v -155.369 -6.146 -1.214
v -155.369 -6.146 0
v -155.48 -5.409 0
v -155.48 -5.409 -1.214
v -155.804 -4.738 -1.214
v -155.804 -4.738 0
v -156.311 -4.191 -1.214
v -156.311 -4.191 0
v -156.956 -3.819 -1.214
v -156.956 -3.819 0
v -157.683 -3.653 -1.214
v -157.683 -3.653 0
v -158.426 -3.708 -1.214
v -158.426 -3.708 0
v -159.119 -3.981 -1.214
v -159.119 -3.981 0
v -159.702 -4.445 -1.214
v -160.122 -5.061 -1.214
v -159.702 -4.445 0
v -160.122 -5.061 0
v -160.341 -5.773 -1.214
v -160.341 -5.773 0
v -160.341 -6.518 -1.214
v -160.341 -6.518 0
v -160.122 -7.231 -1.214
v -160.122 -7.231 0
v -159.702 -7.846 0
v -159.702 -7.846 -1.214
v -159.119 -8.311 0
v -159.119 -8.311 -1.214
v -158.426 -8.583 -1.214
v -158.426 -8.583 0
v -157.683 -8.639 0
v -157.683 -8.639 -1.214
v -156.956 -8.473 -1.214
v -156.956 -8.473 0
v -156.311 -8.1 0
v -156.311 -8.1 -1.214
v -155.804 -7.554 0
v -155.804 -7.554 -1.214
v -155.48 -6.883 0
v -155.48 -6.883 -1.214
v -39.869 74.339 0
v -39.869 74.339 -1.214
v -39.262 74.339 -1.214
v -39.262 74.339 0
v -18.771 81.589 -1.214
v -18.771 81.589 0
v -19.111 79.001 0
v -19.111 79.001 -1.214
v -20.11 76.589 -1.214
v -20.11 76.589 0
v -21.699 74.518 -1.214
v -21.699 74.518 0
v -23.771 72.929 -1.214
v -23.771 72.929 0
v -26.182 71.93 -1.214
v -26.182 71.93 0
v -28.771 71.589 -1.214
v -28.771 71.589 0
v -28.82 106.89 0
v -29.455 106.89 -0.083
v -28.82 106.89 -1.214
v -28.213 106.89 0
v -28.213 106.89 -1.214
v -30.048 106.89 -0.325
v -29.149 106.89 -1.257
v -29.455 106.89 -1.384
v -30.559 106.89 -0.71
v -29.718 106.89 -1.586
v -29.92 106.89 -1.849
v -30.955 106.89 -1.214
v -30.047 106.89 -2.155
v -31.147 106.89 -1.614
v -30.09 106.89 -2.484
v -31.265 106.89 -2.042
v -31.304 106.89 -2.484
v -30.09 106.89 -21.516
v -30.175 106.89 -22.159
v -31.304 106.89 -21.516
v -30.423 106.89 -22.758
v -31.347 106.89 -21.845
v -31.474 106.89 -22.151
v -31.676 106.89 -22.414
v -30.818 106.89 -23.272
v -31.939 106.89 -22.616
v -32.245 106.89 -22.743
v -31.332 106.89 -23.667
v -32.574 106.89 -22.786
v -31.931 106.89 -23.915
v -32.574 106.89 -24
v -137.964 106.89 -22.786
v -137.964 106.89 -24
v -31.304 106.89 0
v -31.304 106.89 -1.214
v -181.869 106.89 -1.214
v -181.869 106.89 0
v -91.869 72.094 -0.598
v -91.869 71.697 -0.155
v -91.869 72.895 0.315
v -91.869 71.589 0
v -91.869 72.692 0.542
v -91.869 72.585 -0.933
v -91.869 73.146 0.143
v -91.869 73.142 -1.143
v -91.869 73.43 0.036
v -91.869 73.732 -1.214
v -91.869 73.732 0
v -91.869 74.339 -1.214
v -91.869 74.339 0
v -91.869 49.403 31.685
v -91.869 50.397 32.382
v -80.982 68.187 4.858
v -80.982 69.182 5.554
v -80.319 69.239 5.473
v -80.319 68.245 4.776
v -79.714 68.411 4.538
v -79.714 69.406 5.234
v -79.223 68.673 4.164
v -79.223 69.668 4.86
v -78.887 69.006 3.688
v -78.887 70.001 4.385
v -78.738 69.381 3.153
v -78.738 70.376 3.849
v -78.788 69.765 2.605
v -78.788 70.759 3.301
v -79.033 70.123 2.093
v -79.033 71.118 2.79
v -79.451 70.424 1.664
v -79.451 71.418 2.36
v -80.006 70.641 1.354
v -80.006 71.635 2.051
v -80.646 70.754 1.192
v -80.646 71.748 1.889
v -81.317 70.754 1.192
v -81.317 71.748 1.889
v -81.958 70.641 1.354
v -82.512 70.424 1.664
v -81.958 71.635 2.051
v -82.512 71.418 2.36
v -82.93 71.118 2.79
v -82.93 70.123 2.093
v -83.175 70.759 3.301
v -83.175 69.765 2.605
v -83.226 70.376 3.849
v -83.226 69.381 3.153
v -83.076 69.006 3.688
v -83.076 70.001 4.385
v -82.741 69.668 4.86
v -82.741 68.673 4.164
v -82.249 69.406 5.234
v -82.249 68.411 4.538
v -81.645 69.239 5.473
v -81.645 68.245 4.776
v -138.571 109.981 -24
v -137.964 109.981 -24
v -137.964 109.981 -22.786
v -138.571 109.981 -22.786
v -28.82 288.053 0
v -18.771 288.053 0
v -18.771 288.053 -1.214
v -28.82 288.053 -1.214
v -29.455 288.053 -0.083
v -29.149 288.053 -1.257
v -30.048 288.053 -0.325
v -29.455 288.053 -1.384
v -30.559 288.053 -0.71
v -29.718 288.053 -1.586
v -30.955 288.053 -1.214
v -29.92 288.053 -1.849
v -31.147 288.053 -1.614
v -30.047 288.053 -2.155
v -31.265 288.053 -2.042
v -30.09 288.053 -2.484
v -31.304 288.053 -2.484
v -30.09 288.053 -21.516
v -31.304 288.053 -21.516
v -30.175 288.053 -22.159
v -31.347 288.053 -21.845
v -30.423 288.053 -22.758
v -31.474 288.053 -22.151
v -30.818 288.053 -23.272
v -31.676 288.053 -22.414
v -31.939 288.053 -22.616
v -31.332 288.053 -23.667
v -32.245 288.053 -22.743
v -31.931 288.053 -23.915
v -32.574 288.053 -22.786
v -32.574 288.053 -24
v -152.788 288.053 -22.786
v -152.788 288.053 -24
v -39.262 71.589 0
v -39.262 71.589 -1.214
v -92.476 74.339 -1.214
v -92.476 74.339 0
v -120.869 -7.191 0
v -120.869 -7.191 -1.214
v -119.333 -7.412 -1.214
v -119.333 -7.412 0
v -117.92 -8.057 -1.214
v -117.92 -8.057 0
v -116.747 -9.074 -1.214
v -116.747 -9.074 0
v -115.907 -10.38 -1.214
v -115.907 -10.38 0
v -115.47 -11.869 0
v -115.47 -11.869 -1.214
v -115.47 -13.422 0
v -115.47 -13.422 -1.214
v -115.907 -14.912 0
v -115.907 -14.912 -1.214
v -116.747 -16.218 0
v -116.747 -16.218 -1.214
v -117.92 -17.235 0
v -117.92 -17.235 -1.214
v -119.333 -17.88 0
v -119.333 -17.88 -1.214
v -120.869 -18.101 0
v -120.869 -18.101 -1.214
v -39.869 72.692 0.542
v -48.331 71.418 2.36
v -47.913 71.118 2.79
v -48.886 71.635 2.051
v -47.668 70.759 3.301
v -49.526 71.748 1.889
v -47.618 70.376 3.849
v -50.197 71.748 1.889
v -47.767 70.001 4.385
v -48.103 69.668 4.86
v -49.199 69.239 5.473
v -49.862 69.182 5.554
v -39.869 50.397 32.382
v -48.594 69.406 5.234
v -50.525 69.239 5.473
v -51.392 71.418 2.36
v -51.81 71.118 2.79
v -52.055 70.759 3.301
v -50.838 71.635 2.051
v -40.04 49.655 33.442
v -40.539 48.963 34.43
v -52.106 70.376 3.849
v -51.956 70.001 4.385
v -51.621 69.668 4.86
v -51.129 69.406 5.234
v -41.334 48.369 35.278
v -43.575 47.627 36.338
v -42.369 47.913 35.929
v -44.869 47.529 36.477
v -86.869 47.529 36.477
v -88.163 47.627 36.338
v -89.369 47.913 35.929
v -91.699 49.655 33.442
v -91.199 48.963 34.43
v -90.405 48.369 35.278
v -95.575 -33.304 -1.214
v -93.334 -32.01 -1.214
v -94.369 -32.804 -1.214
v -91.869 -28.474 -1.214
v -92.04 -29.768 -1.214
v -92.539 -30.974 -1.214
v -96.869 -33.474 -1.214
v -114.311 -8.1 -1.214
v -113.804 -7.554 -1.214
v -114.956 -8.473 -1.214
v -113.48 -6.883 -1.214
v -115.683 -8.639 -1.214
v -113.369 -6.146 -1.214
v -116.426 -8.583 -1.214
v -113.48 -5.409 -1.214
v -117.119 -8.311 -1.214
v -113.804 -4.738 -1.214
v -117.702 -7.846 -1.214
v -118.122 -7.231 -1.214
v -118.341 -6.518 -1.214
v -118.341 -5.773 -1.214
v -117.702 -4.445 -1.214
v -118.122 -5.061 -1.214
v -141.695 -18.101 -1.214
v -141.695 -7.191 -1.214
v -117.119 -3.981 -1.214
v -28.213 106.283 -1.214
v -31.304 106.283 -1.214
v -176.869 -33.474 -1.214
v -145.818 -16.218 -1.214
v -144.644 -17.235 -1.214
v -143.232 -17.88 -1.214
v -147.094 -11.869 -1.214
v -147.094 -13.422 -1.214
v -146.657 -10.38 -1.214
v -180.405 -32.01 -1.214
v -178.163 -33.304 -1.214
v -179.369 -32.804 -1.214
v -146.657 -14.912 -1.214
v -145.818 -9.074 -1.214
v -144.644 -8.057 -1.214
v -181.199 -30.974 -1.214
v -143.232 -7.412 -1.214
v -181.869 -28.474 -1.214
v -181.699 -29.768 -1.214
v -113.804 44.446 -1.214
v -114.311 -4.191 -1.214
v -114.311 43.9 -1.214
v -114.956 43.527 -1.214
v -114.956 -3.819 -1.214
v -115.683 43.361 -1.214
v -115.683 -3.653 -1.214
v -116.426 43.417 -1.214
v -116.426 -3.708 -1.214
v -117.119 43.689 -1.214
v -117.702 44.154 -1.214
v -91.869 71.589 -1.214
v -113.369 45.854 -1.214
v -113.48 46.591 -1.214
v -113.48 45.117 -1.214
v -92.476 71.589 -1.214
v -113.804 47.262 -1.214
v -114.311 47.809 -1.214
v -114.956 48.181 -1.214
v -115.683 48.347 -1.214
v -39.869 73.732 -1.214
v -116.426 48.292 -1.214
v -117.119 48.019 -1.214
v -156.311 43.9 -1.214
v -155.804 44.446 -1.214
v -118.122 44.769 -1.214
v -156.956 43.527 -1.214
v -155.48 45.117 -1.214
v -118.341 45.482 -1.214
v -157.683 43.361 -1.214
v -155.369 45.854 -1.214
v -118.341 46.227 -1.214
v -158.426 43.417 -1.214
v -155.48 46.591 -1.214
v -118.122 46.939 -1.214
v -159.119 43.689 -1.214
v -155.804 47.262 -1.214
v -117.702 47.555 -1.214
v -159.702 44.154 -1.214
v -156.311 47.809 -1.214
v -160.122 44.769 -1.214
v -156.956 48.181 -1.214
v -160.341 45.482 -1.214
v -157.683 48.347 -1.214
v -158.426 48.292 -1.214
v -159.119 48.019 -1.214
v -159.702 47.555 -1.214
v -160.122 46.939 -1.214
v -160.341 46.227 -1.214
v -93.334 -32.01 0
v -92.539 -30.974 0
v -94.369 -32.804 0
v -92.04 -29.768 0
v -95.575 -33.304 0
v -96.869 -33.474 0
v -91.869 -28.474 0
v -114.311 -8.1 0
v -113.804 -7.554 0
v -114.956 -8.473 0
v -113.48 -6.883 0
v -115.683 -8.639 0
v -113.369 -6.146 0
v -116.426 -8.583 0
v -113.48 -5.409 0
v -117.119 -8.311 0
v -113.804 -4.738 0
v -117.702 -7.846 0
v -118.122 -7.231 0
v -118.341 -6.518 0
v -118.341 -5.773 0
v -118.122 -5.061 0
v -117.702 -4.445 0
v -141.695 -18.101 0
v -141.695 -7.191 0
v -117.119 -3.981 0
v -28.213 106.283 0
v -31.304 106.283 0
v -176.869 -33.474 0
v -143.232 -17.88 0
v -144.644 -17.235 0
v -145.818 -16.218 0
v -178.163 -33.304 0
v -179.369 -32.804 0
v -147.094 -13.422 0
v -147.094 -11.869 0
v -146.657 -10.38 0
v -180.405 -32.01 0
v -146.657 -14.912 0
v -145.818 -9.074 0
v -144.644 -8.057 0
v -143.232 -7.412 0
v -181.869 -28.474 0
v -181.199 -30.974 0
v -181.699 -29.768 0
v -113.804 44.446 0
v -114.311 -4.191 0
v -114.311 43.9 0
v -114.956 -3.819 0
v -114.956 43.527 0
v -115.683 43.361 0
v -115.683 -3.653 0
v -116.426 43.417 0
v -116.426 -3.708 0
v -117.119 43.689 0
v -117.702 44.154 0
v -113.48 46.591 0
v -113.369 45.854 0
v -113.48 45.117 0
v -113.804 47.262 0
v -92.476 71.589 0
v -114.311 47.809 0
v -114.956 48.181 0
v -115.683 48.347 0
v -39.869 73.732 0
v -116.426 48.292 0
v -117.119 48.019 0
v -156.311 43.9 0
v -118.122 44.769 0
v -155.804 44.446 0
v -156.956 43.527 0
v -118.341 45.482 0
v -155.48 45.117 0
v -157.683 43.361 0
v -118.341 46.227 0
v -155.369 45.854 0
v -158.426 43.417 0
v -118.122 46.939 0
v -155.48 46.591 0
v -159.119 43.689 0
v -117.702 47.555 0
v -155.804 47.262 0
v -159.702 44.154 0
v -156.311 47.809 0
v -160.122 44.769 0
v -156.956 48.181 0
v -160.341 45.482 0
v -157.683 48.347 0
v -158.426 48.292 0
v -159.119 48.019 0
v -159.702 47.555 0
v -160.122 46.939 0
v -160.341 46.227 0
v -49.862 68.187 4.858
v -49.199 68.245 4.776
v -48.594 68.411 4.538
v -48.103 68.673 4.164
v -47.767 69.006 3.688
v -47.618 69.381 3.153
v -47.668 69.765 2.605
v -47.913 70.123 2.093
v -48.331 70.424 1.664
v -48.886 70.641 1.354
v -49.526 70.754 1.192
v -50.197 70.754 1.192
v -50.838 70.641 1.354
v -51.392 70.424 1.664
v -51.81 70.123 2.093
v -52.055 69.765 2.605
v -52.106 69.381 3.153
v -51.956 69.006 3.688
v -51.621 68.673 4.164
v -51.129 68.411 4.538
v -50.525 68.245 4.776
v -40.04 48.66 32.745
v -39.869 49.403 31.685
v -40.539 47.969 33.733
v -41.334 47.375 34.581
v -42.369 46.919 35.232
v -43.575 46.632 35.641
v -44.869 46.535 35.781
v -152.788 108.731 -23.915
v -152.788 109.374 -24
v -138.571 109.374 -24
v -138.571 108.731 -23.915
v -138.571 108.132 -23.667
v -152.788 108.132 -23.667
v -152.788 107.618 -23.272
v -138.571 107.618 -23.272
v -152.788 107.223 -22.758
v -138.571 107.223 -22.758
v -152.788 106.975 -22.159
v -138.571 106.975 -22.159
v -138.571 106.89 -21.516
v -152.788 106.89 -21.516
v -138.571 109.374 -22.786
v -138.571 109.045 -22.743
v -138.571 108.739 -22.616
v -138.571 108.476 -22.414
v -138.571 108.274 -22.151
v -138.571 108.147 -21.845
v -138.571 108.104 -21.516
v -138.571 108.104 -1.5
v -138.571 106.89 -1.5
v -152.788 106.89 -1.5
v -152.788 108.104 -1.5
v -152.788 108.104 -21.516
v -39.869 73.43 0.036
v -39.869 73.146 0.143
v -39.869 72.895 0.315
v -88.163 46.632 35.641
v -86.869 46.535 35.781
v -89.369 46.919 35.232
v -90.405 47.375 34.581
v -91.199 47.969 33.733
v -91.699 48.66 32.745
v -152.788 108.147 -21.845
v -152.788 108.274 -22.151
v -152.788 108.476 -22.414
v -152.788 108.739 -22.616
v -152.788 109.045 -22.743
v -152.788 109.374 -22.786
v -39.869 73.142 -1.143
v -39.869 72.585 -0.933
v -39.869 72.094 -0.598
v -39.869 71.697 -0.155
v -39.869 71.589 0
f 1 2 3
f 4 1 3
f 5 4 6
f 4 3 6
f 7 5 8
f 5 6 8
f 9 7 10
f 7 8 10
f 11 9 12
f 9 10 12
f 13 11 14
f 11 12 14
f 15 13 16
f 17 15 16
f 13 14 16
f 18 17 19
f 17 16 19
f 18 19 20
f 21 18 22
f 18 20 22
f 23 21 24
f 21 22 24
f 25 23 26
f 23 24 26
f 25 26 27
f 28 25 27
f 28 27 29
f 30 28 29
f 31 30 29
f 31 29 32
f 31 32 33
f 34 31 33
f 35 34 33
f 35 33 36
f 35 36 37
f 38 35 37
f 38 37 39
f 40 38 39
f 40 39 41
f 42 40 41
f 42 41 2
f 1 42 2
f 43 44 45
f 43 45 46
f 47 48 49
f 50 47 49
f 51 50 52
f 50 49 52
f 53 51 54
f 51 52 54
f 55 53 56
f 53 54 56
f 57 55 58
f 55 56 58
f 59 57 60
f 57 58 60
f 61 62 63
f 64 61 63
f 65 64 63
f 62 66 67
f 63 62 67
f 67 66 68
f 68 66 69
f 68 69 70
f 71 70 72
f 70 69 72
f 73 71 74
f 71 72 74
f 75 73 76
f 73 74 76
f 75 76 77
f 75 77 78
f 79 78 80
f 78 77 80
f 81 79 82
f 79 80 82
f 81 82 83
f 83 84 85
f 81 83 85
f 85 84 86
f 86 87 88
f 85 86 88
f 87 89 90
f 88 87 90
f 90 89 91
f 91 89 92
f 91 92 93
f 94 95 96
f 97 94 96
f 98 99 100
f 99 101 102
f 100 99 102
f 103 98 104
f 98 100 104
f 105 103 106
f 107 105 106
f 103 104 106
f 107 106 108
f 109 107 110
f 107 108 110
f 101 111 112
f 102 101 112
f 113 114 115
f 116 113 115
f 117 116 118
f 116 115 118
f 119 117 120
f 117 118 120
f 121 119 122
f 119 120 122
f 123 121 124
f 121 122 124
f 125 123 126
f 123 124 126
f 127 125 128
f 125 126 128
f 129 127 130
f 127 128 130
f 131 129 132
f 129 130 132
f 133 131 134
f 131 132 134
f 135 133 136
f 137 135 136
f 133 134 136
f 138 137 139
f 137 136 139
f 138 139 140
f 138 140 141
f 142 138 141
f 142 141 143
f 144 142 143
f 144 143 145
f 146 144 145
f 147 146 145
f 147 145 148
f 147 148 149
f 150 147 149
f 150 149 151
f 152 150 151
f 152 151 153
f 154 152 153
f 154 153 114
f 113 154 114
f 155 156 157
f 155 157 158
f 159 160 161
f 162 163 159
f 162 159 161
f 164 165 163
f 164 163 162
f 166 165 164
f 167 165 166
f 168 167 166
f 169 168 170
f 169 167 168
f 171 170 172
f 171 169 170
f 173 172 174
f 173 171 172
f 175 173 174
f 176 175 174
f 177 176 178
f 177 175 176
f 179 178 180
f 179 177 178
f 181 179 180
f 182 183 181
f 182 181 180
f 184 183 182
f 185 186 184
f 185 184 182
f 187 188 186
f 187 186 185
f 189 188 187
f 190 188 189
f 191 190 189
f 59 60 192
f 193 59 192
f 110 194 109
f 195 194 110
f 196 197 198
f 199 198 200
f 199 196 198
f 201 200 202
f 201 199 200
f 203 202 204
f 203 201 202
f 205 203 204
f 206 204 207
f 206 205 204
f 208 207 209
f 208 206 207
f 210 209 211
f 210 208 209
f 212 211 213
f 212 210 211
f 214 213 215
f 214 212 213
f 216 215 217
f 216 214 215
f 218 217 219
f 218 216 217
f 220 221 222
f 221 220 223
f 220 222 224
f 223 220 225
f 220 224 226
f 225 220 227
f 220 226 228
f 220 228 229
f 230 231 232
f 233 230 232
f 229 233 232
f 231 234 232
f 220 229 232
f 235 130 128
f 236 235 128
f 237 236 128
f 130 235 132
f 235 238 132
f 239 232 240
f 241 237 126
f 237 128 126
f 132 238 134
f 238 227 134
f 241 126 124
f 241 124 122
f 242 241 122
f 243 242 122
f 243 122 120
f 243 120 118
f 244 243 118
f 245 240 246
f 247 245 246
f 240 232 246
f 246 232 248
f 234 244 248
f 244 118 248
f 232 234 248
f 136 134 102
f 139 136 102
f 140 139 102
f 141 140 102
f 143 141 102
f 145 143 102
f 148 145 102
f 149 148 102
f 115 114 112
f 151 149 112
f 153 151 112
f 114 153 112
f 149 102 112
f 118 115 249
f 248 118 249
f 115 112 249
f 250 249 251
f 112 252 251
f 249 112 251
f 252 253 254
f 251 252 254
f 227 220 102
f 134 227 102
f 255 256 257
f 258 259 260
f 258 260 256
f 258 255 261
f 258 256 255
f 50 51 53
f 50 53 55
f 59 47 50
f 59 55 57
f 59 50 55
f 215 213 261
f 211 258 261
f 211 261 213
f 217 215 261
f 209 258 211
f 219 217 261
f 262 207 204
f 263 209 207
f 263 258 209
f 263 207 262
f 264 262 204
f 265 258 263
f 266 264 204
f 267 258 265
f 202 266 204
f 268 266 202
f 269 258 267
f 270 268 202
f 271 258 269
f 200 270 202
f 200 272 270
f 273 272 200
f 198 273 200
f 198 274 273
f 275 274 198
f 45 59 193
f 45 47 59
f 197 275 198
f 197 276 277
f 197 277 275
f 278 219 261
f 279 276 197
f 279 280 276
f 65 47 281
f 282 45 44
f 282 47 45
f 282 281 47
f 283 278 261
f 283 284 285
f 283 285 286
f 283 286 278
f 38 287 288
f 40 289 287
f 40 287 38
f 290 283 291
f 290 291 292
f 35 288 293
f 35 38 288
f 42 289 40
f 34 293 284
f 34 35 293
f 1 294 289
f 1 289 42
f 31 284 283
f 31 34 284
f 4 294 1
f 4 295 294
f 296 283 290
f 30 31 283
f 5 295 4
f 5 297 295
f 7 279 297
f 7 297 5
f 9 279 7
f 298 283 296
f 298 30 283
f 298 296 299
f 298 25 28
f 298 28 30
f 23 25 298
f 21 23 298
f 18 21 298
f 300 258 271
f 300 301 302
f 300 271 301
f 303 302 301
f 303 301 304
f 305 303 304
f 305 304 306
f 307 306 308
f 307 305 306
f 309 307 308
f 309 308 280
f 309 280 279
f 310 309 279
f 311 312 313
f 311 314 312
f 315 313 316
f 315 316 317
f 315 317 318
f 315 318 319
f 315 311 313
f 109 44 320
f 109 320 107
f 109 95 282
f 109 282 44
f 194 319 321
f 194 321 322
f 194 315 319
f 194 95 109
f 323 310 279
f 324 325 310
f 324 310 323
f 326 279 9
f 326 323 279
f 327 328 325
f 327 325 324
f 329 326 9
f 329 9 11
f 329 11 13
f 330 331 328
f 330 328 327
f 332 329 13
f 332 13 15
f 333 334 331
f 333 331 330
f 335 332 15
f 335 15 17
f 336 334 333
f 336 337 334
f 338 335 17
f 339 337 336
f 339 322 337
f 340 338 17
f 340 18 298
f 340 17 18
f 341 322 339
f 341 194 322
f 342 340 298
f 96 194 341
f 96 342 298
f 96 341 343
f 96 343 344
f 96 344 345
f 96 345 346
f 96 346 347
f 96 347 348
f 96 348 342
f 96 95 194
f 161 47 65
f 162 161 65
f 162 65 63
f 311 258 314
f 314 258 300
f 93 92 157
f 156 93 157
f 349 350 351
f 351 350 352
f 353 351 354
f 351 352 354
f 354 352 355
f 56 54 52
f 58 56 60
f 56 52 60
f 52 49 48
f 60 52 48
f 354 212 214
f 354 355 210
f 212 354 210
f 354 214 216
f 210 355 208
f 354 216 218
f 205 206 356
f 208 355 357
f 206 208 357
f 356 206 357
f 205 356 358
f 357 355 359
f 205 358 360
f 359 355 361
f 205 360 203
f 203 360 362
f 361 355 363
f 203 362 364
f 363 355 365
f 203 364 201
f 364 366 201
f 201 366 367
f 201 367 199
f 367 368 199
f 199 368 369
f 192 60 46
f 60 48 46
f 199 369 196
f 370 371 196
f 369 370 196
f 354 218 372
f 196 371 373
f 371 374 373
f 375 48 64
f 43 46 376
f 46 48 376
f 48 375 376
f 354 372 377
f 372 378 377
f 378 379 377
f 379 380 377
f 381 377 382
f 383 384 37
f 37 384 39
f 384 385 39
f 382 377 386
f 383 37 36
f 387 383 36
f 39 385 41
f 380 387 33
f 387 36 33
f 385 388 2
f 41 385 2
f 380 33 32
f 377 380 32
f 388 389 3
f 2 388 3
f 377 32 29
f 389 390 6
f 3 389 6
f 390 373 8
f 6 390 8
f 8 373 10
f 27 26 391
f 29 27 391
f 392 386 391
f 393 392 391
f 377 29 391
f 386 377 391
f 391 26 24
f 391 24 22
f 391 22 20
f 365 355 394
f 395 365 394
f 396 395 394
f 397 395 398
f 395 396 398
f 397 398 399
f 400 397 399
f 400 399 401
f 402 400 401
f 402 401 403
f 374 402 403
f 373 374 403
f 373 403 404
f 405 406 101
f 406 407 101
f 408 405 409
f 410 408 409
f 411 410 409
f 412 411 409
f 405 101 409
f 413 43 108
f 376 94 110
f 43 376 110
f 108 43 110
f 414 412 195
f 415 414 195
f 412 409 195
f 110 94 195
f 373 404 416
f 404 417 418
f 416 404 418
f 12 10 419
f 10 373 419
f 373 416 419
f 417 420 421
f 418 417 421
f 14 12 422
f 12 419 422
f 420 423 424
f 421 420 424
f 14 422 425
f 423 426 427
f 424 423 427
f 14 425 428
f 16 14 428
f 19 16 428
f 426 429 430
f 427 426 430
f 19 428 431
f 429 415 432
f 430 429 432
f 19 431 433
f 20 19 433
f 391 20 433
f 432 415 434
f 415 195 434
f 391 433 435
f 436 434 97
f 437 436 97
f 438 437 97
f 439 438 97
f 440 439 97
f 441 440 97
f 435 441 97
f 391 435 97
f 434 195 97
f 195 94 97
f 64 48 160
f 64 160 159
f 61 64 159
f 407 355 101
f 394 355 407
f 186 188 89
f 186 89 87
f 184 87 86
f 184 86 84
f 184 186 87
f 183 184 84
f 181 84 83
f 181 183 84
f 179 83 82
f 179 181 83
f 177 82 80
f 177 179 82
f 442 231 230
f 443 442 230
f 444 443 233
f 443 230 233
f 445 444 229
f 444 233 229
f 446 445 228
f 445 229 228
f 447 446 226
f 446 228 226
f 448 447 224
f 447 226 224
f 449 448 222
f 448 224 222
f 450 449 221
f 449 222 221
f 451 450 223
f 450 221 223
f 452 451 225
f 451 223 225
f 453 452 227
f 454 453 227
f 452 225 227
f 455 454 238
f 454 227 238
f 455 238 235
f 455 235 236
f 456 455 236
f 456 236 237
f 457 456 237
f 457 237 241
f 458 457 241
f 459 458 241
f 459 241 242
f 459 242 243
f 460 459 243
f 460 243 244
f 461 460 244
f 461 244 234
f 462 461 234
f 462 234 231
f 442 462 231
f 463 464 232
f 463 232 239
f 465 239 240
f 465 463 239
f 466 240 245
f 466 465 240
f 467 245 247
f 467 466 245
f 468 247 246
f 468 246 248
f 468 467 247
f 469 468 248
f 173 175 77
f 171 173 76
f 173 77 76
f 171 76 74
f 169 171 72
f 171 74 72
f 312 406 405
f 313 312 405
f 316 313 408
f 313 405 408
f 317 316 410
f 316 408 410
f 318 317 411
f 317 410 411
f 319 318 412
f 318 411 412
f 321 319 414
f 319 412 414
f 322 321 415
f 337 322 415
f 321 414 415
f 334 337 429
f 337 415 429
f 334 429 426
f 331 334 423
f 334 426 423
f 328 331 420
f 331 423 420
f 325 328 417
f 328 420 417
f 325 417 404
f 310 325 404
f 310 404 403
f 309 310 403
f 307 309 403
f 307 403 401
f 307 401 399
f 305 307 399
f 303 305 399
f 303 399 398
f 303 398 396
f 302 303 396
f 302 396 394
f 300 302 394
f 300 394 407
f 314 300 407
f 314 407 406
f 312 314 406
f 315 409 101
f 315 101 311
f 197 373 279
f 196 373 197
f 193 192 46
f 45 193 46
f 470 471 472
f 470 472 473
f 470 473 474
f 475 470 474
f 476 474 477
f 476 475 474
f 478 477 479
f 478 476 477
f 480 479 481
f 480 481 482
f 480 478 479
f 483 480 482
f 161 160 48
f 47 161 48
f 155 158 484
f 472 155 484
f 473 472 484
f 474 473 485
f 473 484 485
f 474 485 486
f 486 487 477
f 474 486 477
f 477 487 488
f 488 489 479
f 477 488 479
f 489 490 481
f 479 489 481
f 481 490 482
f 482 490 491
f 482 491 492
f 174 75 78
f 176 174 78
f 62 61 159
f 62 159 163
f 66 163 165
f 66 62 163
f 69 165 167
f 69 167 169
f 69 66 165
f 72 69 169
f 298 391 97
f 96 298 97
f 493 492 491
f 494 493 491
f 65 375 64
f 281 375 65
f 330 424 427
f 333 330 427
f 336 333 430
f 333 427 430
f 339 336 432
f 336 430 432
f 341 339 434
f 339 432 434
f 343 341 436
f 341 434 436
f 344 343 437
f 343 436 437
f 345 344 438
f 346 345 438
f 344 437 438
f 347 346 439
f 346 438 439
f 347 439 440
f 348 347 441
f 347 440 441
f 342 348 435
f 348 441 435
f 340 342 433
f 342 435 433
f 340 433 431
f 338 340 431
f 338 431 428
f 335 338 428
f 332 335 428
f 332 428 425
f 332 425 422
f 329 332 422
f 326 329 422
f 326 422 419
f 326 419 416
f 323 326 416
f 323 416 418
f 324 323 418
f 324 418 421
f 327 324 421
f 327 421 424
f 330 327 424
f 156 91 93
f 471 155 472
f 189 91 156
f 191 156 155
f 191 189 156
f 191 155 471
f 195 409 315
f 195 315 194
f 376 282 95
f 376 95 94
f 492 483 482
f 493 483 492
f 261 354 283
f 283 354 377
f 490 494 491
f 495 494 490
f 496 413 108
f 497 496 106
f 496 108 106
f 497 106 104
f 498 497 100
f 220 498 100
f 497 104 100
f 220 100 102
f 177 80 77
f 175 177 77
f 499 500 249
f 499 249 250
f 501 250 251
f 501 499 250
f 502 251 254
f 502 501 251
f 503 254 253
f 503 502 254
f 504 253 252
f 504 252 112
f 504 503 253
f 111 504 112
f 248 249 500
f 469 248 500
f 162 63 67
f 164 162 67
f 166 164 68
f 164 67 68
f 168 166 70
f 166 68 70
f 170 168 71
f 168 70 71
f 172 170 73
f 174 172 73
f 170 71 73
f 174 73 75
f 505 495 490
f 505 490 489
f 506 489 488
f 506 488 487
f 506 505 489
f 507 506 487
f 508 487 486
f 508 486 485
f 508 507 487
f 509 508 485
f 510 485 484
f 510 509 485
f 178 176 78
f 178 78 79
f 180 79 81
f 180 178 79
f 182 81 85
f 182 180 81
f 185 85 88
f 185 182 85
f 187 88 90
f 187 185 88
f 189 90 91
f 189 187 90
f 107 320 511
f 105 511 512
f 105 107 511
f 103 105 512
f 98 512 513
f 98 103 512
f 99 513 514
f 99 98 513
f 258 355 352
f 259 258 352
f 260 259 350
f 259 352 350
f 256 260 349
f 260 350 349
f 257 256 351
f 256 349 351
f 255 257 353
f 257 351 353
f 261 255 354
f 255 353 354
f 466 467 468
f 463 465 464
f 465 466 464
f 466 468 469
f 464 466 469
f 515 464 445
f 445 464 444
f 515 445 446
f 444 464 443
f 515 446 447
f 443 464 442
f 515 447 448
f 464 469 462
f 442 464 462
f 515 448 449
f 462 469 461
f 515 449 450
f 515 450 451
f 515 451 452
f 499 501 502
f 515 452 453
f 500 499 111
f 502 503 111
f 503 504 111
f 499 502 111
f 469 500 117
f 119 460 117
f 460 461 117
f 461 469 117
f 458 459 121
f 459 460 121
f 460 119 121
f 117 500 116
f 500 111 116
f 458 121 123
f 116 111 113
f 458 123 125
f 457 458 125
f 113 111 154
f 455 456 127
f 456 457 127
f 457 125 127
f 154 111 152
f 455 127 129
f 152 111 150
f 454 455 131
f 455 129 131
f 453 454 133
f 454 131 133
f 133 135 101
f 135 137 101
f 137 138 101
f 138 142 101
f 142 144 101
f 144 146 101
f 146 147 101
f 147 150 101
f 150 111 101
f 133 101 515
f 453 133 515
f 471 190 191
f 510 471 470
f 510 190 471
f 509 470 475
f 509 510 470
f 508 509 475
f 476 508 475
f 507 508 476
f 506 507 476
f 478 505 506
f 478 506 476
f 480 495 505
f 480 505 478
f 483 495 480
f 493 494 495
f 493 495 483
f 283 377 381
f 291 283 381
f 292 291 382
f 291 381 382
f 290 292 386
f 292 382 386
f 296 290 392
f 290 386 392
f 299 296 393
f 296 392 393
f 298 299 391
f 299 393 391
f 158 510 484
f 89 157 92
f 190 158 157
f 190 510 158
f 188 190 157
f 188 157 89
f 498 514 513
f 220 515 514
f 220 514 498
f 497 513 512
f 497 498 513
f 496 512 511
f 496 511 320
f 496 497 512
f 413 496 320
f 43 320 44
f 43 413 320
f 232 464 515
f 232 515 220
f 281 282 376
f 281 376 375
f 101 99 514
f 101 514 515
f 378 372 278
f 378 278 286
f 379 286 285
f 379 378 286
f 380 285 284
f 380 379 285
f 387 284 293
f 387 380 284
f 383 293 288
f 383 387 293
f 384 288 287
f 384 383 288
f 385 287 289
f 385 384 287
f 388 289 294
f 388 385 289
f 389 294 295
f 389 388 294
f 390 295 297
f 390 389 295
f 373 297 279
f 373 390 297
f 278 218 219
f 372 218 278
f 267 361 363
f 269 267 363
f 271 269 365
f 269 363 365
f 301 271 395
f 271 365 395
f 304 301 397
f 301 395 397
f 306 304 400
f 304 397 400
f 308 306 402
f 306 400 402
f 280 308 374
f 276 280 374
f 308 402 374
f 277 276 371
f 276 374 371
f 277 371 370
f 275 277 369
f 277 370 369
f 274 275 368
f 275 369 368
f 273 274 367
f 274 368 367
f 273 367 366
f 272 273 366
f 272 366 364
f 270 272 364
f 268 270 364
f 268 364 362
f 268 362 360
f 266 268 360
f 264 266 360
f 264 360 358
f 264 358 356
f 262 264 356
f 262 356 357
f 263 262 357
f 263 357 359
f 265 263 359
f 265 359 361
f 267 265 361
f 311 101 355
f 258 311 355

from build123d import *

# Parameters (mm, degrees)
BASE_FLANGE1_DEPTH            = 1.21412
SKETCH19_W                    = 150.565156201
SKETCH19_H                    = 181.162980563
CUT_EXTRUDE2_DEPTH            = 5
EDGE_FLANGE5_START            = 106.282964216
EDGE_FLANGE5_DEPTH            = 181.770040563
EDGE_FLANGE5_2_DEPTH          = 0.60706
EDGE_FLANGE5_START_2          = 106.890024216
EDGE_FLANGE5_3_DEPTH          = 181.162980563
EDGE_FLANGE6_STRIP_W          = 7.39648
EDGE_FLANGE6_STRIP_H          = 1.21412
EDGE_FLANGE6_STRIP_CUT_DEPTH  = 181.162980563
EDGE_FLANGE6_DEPTH            = 181.162980563
EDGE_FLANGE7_STRIP_W          = 7.39648
EDGE_FLANGE7_STRIP_H          = 1.21412
EDGE_FLANGE7_STRIP_CUT_DEPTH  = 14.216886025
EDGE_FLANGE7_RELIEF_W         = 8.00354
EDGE_FLANGE7_RELIEF_H         = 0.60706
EDGE_FLANGE7_RELIEF_CUT_DEPTH = 1.21412
EDGE_FLANGE7_DEPTH            = 14.216886025
SKETCH29_R                    = 2.5
CUT_EXTRUDE3_DEPTH            = 5
EDGE_FLANGE8_START            = -92.476413081
EDGE_FLANGE8_DEPTH            = 53.21412
EDGE_FLANGE8_2_DEPTH          = 0.60706
EDGE_FLANGE8_START_2          = -39.869353081
EDGE_FLANGE8_3_DEPTH          = 0.60706
EDGE_FLANGE8_START_3          = -91.869353081
EDGE_FLANGE8_4_DEPTH          = 52
EDGE_FLANGE8_START_4          = 58
EDGE_FLANGE8_5_DEPTH          = 2.895111402
SKETCH34_R                    = 2.25
CUT_EXTRUDE6_DEPTH            = 10


with BuildPart() as part:
    # Base-Flange1: sheet metal written as solids
    # Sketch1 → Base-Flange1 (new body)
    with BuildSketch(Plane.XY):
        with BuildLine():
            Line((-96.869353081, -33.474110531), (-176.869353081, -33.474110531))
            ThreePointArc((-176.869353081, -33.474110531), (-180.404886987, -32.009644437), (-181.869353081, -28.474110531))
            Line((-181.869353081, -28.474110531), (-181.869353081, 288.053004779))
            Line((-181.869353081, 288.053004779), (-18.770502539, 288.053004779))
            Line((-18.770502539, 288.053004779), (-18.770502539, 81.588857582))
            ThreePointArc((-18.770502539, 81.588857582), (-21.699434728, 74.51778977), (-28.770502539, 71.588857582))
            Line((-28.770502539, 71.588857582), (-91.869353081, 71.588857582))
            Line((-91.869353081, 71.588857582), (-91.869353081, -28.474110531))
            ThreePointArc((-91.869353081, -28.474110531), (-93.333819175, -32.009644437), (-96.869353081, -33.474110531))
        make_face()
    extrude(amount=-BASE_FLANGE1_DEPTH)

    # Sketch19 → Cut-Extrude2 (cut)
    with BuildSketch(Plane(origin=(0, 0, -1.21412), x_dir=(-1, 0, 0), z_dir=(0, 0, -1))):
        with Locations((106.586774981, 197.471514497)):
            Rectangle(SKETCH19_W, SKETCH19_H)
    extrude(amount=-CUT_EXTRUDE2_DEPTH, mode=Mode.SUBTRACT)

    # Edge-Flange5: read off the stored shape, not the designer's step
    # Edge-Flange5 outline → Edge-Flange5 (cut)
    with BuildSketch(Plane(origin=(0, 0, 0), x_dir=(1, 0, 0), z_dir=(0, 1, 0)).offset(EDGE_FLANGE5_START)):
        with BuildLine():
            Line((-31.30419688, 0), (-28.82007688, 0))
            ThreePointArc((-28.82007688, 0), (-30.04808742, 0.324758454), (-30.955012985, 1.21412))
            Line((-30.955012985, 1.21412), (-31.30419688, 1.21412))
            Line((-31.30419688, 1.21412), (-31.30419688, 0))
        make_face()
    extrude(amount=EDGE_FLANGE5_DEPTH, mode=Mode.SUBTRACT)

    # Edge-Flange5 2 outline → Edge-Flange5 2 (cut)
    with BuildSketch(Plane(origin=(0, 0, 0), x_dir=(1, 0, 0), z_dir=(0, 1, 0)).offset(EDGE_FLANGE5_START)):
        with BuildLine():
            Line((-28.21301688, 0), (-28.21301688, 1.21412))
            Line((-28.21301688, 1.21412), (-30.955012985, 1.21412))
            ThreePointArc((-30.955012985, 1.21412), (-30.04808742, 0.324758454), (-28.82007688, 0))
            Line((-28.82007688, 0), (-28.21301688, 0))
        make_face()
    extrude(amount=EDGE_FLANGE5_2_DEPTH, mode=Mode.SUBTRACT)

    # Edge-Flange5 3 outline → Edge-Flange5 3 (add)
    with BuildSketch(Plane(origin=(0, 0, 0), x_dir=(1, 0, 0), z_dir=(0, 1, 0)).offset(EDGE_FLANGE5_START_2)):
        with BuildLine():
            Line((-30.955012985, 1.21412), (-28.82007688, 1.21412))
            ThreePointArc((-28.82007688, 1.21412), (-29.718102492, 1.586094388), (-30.09007688, 2.48412))
            Line((-30.09007688, 2.48412), (-30.09007688, 24))
            Line((-30.09007688, 24), (-31.30419688, 24))
            Line((-31.30419688, 24), (-31.30419688, 2.48412))
            ThreePointArc((-31.30419688, 2.48412), (-31.215310653, 1.825555388), (-30.955012985, 1.21412))
        make_face()
    extrude(amount=EDGE_FLANGE5_3_DEPTH)

    # Edge-Flange6: sheet metal written as solids
    # Edge-Flange6 strip (on a plane across the edge) → Edge-Flange6 strip cut (cut)
    with BuildSketch(Plane(origin=(-31.30419688, 288.053004779, -24), x_dir=(0, 0, 1), z_dir=(0, -1, 0))):
        with Locations((-1.21412, -0.60706)):
            Rectangle(EDGE_FLANGE6_STRIP_W, EDGE_FLANGE6_STRIP_H)
    extrude(amount=EDGE_FLANGE6_STRIP_CUT_DEPTH, mode=Mode.SUBTRACT)

    # Edge-Flange6 section (on a plane across the edge) → Edge-Flange6 (add)
    with BuildSketch(Plane(origin=(-31.30419688, 288.053004779, -24), x_dir=(0, 0, 1), z_dir=(0, -1, 0))):
        with BuildLine():
            Line((0, 1.27), (0, 121.48412))
            Line((0, 121.48412), (1.21412, 121.48412))
            Line((1.21412, 121.48412), (1.21412, 1.27))
            ThreePointArc((1.21412, 1.27), (1.586094388, 0.371974388), (2.48412, 0))
            Line((2.48412, 0), (2.48412, -1.21412))
            ThreePointArc((2.48412, -1.21412), (0.727581903, -0.486538097), (0, 1.27))
        make_face()
    extrude(amount=EDGE_FLANGE6_DEPTH)

    # Edge-Flange7: sheet metal written as solids
    # Edge-Flange7 strip (on a plane across the edge) → Edge-Flange7 strip cut (cut)
    with BuildSketch(Plane(origin=(-152.78831688, 106.890024216, -22.78588), x_dir=(0, 1, 0), z_dir=(1, 0, 0))):
        with Locations((-1.21412, -0.60706)):
            Rectangle(EDGE_FLANGE7_STRIP_W, EDGE_FLANGE7_STRIP_H)
    extrude(amount=EDGE_FLANGE7_STRIP_CUT_DEPTH, mode=Mode.SUBTRACT)

    # Edge-Flange7 relief (on the sheet) → Edge-Flange7 relief cut (cut)
    with BuildSketch(Plane(origin=(-152.78831688, 109.374144216, -22.78588), x_dir=(0, 1, 0), z_dir=(0, 0, 1))):
        with Locations((-3.39471, -14.520416025)):
            Rectangle(EDGE_FLANGE7_RELIEF_W, EDGE_FLANGE7_RELIEF_H)
    extrude(amount=-EDGE_FLANGE7_RELIEF_CUT_DEPTH, mode=Mode.SUBTRACT)

    # Edge-Flange7 section (on a plane across the edge) → Edge-Flange7 (add)
    with BuildSketch(Plane(origin=(-152.78831688, 106.890024216, -22.78588), x_dir=(0, 1, 0), z_dir=(1, 0, 0))):
        with BuildLine():
            Line((0, 1.27), (0, 21.28588))
            Line((0, 21.28588), (1.21412, 21.28588))
            Line((1.21412, 21.28588), (1.21412, 1.27))
            ThreePointArc((1.21412, 1.27), (1.586094388, 0.371974388), (2.48412, 0))
            Line((2.48412, 0), (2.48412, -1.21412))
            ThreePointArc((2.48412, -1.21412), (0.727581903, -0.486538097), (0, 1.27))
        make_face()
    extrude(amount=EDGE_FLANGE7_DEPTH)

    # Sketch29 → Cut-Extrude3 (cut)
    with BuildSketch(Plane.XY):
        with Locations((-157.869353081, 45.8541873)):
            Circle(SKETCH29_R)
        with Locations((-115.869353081, 45.8541873)):
            Circle(SKETCH29_R)
        with Locations((-157.869353081, -6.1458127)):
            Circle(SKETCH29_R)
        with Locations((-115.869353081, -6.1458127)):
            Circle(SKETCH29_R)
        with BuildLine():
            Line((-120.869353081, -18.100802087), (-141.694922457, -18.100802087))
            ThreePointArc((-141.694922457, -18.100802087), (-147.149911844, -12.6458127), (-141.694922457, -7.190823313))
            Line((-141.694922457, -7.190823313), (-120.869353081, -7.190823313))
            ThreePointArc((-120.869353081, -7.190823313), (-115.414363694, -12.6458127), (-120.869353081, -18.100802087))
        make_face()
    extrude(amount=-CUT_EXTRUDE3_DEPTH, mode=Mode.SUBTRACT)

    # Edge-Flange8: read off the stored shape, not the designer's step
    # Edge-Flange8 outline → Edge-Flange8 (cut)
    with BuildSketch(Plane.YZ.offset(EDGE_FLANGE8_START)):
        with BuildLine():
            Line((71.588857582, -1.21412), (73.732144579, -1.21412))
            ThreePointArc((73.732144579, -1.21412), (72.585105614, -0.933441351), (71.697272603, -0.154832697))
            Line((71.697272603, -0.154832697), (71.588857582, 0))
            Line((71.588857582, 0), (71.588857582, -1.21412))
        make_face()
    extrude(amount=EDGE_FLANGE8_DEPTH, mode=Mode.SUBTRACT)

    # Edge-Flange8 2 outline → Edge-Flange8 2 (cut)
    with BuildSketch(Plane.YZ.offset(EDGE_FLANGE8_START)):
        with BuildLine():
            Line((74.339204579, -1.21412), (74.339204579, 0))
            Line((74.339204579, 0), (71.588857582, 0))
            Line((71.588857582, 0), (71.697272603, -0.154832697))
            ThreePointArc((71.697272603, -0.154832697), (72.585105614, -0.933441351), (73.732144579, -1.21412))
            Line((73.732144579, -1.21412), (74.339204579, -1.21412))
        make_face()
    extrude(amount=EDGE_FLANGE8_2_DEPTH, mode=Mode.SUBTRACT)

    # Edge-Flange8 3 outline → Edge-Flange8 3 (cut)
    with BuildSketch(Plane.YZ.offset(EDGE_FLANGE8_START_2)):
        with BuildLine():
            Line((74.339204579, -1.21412), (74.339204579, 0))
            Line((74.339204579, 0), (71.588857582, 0))
            Line((71.588857582, 0), (71.697272603, -0.154832697))
            ThreePointArc((71.697272603, -0.154832697), (72.585105614, -0.933441351), (73.732144579, -1.21412))
            Line((73.732144579, -1.21412), (74.339204579, -1.21412))
        make_face()
    extrude(amount=EDGE_FLANGE8_3_DEPTH, mode=Mode.SUBTRACT)

    # Edge-Flange8 4 outline → Edge-Flange8 4 (add)
    with BuildSketch(Plane.YZ.offset(EDGE_FLANGE8_START_3)):
        with BuildLine():
            Line((71.588857582, 0), (73.732144579, 0))
            ThreePointArc((73.732144579, 0), (73.14572384, 0.143496242), (72.691821483, 0.541557926))
            Line((72.691821483, 0.541557926), (47.529257546, 36.477423457))
            Line((47.529257546, 36.477423457), (46.534708666, 35.781032834))
            Line((46.534708666, 35.781032834), (71.588857582, 0))
        make_face()
    extrude(amount=EDGE_FLANGE8_4_DEPTH)

    # Edge-Flange8 5 outline → Edge-Flange8 5 (cut)
    with BuildSketch(Plane(origin=(0, 0, 0), x_dir=(1, 0, 0), z_dir=(0, 0.8191520442889886, 0.5735764363510508)).offset(EDGE_FLANGE8_START_4)):
        with BuildLine():
            ThreePointArc((-39.869353081, 2.381106171), (-41.333819175, -1.154427735), (-44.869353081, -2.618893829))
            Line((-44.869353081, -2.618893829), (-39.869353081, -2.61889383))
            Line((-39.869353081, -2.61889383), (-39.869353081, 2.381106171))
        make_face()
        with BuildLine():
            Line((-91.869353081, -2.61889383), (-86.869353081, -2.618893829))
            ThreePointArc((-86.869353081, -2.618893829), (-90.404886987, -1.154427735), (-91.869353081, 2.381106171))
            Line((-91.869353081, 2.381106171), (-91.869353081, -2.61889383))
        make_face()
    extrude(amount=EDGE_FLANGE8_5_DEPTH, mode=Mode.SUBTRACT)

    # Sketch34 → Cut-Extrude6 (cut)
    with BuildSketch(Plane(origin=(0, 49.031393336, 34.332151223), x_dir=(1, 0, 0), z_dir=(0, 0.8191520442889887, 0.5735764363510506))):
        with Locations(Location((-80.981806948, 37.381106171, 0), (0, 0, 270))):
            Circle(SKETCH34_R)
        with Locations(Location((-49.861806948, 37.381106171, 0), (0, 0, 270))):
            Circle(SKETCH34_R)
    extrude(amount=-CUT_EXTRUDE6_DEPTH, mode=Mode.SUBTRACT)


solid = part.part
